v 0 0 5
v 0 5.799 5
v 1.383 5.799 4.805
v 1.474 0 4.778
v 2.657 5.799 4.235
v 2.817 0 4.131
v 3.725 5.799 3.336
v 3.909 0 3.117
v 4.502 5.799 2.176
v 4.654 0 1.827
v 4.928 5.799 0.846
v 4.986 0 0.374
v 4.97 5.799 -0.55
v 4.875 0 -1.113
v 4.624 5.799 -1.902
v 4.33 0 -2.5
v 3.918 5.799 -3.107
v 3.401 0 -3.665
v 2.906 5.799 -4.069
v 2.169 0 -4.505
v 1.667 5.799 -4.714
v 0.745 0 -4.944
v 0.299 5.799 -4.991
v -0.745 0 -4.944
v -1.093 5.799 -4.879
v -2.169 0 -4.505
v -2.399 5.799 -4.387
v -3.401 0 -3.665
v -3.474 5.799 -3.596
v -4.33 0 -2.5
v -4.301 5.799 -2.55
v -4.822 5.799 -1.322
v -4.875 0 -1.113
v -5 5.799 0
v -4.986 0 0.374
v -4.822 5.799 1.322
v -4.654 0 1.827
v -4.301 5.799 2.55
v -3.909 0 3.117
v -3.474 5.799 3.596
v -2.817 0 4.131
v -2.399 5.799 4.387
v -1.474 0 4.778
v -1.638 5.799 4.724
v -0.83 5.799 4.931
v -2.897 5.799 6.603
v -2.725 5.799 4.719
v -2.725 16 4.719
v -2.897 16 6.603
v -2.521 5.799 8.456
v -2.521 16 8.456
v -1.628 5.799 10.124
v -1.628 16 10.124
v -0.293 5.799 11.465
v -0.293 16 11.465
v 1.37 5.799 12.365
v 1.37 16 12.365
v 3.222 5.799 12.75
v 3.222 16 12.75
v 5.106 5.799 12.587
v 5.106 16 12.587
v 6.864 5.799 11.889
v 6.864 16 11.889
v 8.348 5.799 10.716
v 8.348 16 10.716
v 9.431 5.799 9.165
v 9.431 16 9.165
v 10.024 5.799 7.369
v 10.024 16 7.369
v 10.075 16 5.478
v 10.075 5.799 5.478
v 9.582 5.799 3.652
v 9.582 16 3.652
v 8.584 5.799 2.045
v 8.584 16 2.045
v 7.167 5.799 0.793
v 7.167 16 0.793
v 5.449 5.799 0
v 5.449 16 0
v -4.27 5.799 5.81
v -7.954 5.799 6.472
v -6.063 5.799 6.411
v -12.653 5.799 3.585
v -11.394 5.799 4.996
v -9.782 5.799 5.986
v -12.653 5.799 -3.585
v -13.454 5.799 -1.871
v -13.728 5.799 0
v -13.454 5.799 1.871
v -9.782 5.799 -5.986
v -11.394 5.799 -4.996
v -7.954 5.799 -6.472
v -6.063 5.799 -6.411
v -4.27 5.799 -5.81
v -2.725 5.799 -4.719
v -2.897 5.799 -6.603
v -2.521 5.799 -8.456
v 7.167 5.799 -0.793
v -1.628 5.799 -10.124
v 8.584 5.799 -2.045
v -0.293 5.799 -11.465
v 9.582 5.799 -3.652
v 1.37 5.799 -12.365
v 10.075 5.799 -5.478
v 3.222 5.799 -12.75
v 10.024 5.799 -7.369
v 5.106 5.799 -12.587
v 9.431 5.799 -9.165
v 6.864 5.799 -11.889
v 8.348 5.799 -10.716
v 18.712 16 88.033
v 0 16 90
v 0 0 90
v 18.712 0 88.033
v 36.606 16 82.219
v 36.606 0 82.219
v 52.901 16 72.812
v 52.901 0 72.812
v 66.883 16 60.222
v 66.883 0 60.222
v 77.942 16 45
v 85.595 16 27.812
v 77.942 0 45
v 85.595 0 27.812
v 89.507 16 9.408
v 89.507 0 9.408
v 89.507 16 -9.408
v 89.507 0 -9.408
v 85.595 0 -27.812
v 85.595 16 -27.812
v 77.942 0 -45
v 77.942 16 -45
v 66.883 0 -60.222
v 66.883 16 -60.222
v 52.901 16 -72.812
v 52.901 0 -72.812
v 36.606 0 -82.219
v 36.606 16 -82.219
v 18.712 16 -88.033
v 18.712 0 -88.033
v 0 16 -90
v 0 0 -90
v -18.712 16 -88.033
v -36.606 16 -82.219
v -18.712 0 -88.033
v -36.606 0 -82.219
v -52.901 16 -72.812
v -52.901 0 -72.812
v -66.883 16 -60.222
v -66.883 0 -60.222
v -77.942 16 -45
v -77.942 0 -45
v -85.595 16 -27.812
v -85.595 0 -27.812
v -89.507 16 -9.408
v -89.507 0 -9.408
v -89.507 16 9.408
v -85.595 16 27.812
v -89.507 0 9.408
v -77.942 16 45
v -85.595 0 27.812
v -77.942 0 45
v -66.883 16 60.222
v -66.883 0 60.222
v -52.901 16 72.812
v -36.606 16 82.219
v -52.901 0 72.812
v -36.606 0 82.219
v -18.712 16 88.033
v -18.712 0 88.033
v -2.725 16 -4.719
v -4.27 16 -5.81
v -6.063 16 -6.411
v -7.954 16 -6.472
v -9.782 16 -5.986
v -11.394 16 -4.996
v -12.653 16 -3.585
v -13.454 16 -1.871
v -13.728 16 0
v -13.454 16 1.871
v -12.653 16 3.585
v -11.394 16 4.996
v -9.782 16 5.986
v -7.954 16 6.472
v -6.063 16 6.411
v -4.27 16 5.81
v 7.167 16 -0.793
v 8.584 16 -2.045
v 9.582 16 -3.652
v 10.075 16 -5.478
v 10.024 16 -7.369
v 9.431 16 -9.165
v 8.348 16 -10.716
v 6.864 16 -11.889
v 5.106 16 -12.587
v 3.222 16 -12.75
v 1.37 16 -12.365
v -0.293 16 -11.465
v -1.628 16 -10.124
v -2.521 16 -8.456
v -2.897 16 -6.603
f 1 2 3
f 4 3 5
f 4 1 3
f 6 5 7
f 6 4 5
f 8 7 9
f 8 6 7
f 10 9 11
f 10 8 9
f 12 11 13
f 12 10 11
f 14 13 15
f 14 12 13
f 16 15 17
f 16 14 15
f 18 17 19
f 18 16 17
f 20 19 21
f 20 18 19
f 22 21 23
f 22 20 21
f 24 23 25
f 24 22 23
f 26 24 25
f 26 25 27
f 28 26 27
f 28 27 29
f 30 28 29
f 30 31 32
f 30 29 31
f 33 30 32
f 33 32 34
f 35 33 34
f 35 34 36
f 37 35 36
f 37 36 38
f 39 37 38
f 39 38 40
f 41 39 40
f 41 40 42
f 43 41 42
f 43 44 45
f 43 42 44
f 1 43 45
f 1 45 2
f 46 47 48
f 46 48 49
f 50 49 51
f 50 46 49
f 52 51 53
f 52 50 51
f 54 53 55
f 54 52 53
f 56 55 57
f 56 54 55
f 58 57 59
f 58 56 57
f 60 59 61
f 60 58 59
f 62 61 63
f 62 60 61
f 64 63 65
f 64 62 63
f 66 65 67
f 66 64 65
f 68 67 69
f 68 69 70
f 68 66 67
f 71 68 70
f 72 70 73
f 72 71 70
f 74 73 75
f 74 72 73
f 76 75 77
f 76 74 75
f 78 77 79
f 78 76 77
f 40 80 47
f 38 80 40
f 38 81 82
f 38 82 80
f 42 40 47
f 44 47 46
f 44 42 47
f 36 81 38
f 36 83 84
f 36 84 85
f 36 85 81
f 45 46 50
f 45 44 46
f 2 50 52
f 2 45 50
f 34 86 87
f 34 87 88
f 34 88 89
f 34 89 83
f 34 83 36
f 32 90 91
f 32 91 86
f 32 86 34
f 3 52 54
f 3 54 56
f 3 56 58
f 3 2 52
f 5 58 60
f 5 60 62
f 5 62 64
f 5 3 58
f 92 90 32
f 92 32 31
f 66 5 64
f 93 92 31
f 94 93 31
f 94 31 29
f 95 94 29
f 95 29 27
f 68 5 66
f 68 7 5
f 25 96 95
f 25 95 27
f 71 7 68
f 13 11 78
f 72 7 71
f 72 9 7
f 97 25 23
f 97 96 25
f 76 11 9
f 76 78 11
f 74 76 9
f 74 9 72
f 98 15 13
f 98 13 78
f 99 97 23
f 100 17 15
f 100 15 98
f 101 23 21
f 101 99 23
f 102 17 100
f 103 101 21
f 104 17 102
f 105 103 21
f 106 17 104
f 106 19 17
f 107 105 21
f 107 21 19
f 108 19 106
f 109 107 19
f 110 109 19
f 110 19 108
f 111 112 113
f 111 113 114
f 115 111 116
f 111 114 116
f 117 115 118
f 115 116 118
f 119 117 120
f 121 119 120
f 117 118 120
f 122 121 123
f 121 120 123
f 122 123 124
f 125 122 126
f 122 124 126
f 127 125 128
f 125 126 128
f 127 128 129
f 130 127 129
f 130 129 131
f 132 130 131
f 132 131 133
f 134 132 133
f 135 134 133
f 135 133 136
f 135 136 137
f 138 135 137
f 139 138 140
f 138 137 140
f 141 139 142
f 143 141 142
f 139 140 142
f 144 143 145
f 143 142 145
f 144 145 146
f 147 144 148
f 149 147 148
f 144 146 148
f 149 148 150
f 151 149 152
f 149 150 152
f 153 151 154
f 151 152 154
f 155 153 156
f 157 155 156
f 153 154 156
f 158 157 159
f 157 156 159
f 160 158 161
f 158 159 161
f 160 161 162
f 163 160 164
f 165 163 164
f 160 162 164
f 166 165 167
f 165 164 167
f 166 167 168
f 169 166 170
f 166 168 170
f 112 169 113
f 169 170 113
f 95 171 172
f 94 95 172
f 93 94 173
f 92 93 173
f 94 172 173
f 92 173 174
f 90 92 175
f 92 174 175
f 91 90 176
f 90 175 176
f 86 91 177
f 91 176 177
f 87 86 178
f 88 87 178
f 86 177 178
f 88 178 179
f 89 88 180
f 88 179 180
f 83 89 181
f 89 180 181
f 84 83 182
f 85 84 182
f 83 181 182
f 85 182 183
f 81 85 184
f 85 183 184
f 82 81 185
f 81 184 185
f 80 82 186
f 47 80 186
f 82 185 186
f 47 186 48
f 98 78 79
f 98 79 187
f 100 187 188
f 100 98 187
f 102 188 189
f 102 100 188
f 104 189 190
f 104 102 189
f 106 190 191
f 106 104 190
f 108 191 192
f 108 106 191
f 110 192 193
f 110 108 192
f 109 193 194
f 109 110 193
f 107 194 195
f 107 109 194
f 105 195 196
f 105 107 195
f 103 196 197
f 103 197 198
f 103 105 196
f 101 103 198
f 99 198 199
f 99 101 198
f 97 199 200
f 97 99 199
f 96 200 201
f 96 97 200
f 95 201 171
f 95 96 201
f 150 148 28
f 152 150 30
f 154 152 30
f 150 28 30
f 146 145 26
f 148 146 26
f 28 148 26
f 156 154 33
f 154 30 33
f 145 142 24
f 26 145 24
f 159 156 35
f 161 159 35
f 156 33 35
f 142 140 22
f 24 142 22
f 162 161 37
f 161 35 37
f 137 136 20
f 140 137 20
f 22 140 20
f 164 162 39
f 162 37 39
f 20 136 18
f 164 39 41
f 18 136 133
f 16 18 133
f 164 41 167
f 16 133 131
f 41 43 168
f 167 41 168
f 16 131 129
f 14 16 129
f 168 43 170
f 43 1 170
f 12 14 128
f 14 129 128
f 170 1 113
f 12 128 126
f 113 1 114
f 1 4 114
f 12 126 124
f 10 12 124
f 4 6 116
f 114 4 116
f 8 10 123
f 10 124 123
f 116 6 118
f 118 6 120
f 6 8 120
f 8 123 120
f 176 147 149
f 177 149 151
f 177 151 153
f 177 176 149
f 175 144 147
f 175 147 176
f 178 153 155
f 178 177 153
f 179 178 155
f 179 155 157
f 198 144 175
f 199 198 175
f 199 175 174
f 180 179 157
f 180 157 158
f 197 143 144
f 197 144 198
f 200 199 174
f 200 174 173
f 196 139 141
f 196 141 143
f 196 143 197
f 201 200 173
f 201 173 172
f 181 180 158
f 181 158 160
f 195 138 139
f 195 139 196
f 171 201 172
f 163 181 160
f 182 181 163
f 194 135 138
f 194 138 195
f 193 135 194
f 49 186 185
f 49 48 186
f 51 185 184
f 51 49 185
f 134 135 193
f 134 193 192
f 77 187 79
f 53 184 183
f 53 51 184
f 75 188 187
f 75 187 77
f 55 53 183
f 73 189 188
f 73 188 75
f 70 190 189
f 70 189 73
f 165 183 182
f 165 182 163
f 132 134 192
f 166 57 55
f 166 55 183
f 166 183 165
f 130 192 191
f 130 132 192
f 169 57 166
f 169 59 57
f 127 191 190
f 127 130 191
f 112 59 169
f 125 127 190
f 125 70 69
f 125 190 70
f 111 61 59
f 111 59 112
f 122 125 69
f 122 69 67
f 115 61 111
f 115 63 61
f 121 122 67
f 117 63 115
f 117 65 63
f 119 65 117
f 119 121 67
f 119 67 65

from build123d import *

# Parameters (mm, degrees)
SKETCH1_R           = 90
BOSS_EXTRUDE1_DEPTH = 16
SKETCH2_R           = 5
CUT_EXTRUDE1_DEPTH  = 129.280941687
SKETCH3_R           = 6.513808384
CUT_EXTRUDE2_DEPTH  = 10.201451925
CIRPATTERN1_COUNT   = 3


with BuildPart() as part:
    # Sketch1 → Boss-Extrude1 (new body)
    with BuildSketch(Plane(origin=(0, 0, 0), x_dir=(1, 0, 0), z_dir=(0, 1, 0))):
        Circle(SKETCH1_R)
    extrude(amount=BOSS_EXTRUDE1_DEPTH)

    # Sketch2 → Cut-Extrude1 (cut, through all)
    with BuildSketch(Plane(origin=(0, 0, 0), x_dir=(1, 0, 0), z_dir=(0, 1, 0))):
        Circle(SKETCH2_R)
    extrude(amount=CUT_EXTRUDE1_DEPTH, mode=Mode.SUBTRACT)

    # Sketch3 → Cut-Extrude2 (cut)
    with BuildSketch(Plane(origin=(0, 16, 0), x_dir=(1, 0, 0), z_dir=(0, 1, 0))):
        with Locations((-7.214525681, 0)):
            Circle(SKETCH3_R)
    cut_extrude2 = extrude(amount=-CUT_EXTRUDE2_DEPTH, mode=Mode.SUBTRACT)

    # CirPattern1: Cut-Extrude2 ×3 about axis
    cirpattern1_axis = Axis((0, 0, 0), (0, 1, 0))
    for i in range(1, CIRPATTERN1_COUNT):
        add(cut_extrude2.rotate(cirpattern1_axis, i * 360 / CIRPATTERN1_COUNT), mode=Mode.SUBTRACT)


solid = part.part
